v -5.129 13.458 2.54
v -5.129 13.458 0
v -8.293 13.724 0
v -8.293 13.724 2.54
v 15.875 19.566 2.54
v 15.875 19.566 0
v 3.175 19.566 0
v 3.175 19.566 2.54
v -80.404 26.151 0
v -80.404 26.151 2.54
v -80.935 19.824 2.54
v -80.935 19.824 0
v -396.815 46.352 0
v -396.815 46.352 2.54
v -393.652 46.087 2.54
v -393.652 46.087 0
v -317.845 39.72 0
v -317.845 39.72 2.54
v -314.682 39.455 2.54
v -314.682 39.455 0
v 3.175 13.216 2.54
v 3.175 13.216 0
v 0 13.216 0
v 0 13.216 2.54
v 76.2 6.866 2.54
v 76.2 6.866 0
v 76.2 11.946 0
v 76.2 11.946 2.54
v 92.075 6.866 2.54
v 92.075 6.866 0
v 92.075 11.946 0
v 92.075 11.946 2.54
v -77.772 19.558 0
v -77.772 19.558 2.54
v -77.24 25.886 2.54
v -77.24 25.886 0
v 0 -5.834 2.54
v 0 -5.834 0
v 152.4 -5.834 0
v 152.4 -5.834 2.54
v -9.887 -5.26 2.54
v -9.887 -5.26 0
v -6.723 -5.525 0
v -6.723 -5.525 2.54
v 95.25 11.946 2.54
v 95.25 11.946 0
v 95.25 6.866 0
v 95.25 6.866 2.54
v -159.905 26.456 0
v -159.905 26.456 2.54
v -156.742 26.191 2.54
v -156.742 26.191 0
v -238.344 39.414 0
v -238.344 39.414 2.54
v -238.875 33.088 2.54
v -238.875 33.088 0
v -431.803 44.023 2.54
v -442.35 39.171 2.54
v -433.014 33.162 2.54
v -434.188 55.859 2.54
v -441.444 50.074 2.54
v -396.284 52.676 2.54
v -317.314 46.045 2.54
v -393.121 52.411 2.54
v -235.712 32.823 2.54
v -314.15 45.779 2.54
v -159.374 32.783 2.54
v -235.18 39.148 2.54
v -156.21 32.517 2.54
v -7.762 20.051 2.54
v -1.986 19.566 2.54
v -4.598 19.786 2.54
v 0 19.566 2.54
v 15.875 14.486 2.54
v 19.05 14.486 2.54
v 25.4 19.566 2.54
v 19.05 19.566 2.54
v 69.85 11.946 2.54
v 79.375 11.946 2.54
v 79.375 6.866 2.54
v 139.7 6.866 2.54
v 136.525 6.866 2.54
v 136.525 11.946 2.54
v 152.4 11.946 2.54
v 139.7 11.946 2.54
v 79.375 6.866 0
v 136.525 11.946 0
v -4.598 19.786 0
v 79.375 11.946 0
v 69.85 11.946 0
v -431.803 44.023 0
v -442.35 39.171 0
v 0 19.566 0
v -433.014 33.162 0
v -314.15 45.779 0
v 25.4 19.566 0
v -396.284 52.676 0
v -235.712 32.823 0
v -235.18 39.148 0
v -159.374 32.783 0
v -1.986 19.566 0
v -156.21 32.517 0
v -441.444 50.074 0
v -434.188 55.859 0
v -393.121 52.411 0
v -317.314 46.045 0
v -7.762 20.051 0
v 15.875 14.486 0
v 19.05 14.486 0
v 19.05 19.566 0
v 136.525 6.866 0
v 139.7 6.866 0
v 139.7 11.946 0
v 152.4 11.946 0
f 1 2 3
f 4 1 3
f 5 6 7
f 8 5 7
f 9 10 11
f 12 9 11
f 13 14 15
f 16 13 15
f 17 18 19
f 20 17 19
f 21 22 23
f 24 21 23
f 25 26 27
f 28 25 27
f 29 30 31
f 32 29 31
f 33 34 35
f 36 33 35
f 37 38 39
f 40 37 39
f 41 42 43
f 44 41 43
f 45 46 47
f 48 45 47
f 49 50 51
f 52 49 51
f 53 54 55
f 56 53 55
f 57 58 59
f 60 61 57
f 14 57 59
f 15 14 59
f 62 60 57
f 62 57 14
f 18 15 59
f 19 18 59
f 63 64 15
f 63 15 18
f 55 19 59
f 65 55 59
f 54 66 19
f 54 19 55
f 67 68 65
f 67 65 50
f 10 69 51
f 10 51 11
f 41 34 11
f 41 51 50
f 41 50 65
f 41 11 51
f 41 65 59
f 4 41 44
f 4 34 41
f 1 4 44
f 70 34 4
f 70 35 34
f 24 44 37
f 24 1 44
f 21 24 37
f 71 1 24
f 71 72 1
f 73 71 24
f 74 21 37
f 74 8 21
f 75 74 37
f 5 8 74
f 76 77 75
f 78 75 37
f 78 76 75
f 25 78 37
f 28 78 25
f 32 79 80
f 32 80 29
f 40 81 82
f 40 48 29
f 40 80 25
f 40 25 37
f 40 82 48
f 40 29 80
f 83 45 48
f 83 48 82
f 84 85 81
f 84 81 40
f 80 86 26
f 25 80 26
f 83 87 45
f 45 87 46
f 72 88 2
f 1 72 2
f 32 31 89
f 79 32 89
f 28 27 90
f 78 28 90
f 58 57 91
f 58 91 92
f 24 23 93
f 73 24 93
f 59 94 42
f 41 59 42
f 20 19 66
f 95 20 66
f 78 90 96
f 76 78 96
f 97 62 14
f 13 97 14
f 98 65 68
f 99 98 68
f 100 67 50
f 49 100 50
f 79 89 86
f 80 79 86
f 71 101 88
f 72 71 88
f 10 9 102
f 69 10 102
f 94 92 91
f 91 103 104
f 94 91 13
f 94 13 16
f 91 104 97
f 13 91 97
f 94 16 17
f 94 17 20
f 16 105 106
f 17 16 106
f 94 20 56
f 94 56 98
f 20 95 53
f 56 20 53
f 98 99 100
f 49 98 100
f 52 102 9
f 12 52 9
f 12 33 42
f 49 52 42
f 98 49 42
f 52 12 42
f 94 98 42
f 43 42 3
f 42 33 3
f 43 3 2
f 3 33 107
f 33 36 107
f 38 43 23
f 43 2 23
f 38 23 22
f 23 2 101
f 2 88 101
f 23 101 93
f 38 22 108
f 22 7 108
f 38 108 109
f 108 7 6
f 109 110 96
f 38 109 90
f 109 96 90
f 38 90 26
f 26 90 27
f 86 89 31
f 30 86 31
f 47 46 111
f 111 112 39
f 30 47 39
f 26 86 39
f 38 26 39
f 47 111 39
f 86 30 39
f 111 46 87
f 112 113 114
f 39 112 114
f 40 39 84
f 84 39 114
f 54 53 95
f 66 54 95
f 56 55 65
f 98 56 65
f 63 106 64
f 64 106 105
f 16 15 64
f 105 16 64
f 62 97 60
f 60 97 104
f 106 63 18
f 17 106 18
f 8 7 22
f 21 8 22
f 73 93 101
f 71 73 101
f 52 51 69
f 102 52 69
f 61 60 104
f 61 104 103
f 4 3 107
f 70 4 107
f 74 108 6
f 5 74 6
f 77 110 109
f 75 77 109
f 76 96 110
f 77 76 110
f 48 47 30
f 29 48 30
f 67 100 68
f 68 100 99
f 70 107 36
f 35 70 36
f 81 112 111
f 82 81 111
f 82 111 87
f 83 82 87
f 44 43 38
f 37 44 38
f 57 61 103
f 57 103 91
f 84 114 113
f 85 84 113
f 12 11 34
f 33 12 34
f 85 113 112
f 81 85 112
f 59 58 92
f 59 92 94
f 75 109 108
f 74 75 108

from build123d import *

# Parameters (mm, degrees)
BOSS_EXTRUDE1_DEPTH     = 2.54
CUT_EXTRUDE1_DEPTH      = 1
CUT_EXTRUDE1_DEPTH_BACK = 3.54
CUT_EXTRUDE2_DEPTH      = 7.62


with BuildPart() as part:
    # Sketch1 → Boss-Extrude1 (new body)
    with BuildSketch(Plane.XY):
        Polygon((-945.957227657, 86.137779906), (-945.969713578, 86.1172966), (-949.121092485, 86.403457059), (-949.65244679, 80.075727402), (-9.887238192, -5.25964904), (-6.723373364, -5.525326193), (0, -5.833733414), (152.4, -5.833733414), (152.4, 11.946266586), (139.7, 11.946266586), (139.7, 6.866266586), (136.525, 6.866266586), (136.525, 11.946266586), (95.25, 11.946266586), (95.25, 6.866266586), (92.075, 6.866266586), (92.075, 11.946266586), (79.375, 11.946266586), (79.375, 6.866266586), (76.2, 6.866266586), (76.2, 11.946266586), (69.85, 11.946266586), (25.4, 19.566266586), (19.05, 19.566266586), (19.05, 14.486266586), (15.875, 14.486266586), (15.875, 19.566266586), (3.175, 19.566266586), (3.175, 13.216266586), (0, 13.216266586), (0, 19.566266586), (-1.98607431, 19.566266586), (-4.597956143, 19.785592432), (-5.129310448, 13.457862776), (-8.293175277, 13.723539928), (-7.761820971, 20.051269584), (-944.89858306, 98.744842179), align=None)
    extrude(amount=BOSS_EXTRUDE1_DEPTH)

    # Sketch2 → Cut-Extrude1 (cut, two sides)
    with BuildSketch(Plane.XY.offset(2.54)) as cut_extrude1_sk:
        Polygon((-867.4716203, 85.879017088), (-866.940953695, 92.198557139), (-870.104818523, 92.464234292), (-870.635482595, 86.144724398), align=None)
        Polygon((-788.501617399, 79.246962625), (-787.970887585, 85.567255411), (-791.134752413, 85.832932563), (-791.665479694, 79.512669935), align=None)
        Polygon((-709.531614498, 72.614908162), (-709.000821475, 78.935953682), (-712.164686303, 79.201630835), (-712.695476794, 72.880615473), align=None)
        Polygon((-630.561611597, 65.9828537), (-630.030755365, 72.304651954), (-633.194620194, 72.570329107), (-633.725473893, 66.24856101), align=None)
        Polygon((-551.591608696, 59.350799237), (-551.060689256, 65.673350226), (-554.224554084, 65.939027378), (-554.755470992, 59.616506547), align=None)
        Polygon((-472.621605795, 52.718744774), (-472.090623146, 59.042048497), (-475.254487974, 59.30772565), (-475.785468091, 52.984452084), align=None)
        Polygon((-393.651602894, 46.086690311), (-393.120557036, 52.410746769), (-396.284421864, 52.676423921), (-396.81546519, 46.352397622), align=None)
        Polygon((-314.681599993, 39.454635849), (-314.150490926, 45.77944504), (-317.314355754, 46.045122193), (-317.845462289, 39.720343159), align=None)
        Polygon((-235.711597092, 32.822581386), (-235.180424816, 39.148143312), (-238.344289645, 39.413820465), (-238.875459388, 33.088288696), align=None)
        Polygon((-156.741594191, 26.190526923), (-156.210358707, 32.516841584), (-159.374223535, 32.782518736), (-159.905456487, 26.456234233), align=None)
        Polygon((-77.240292597, 25.885539855), (-80.404157425, 26.151217008), (-80.935453586, 19.824179771), (-77.77159129, 19.55847246), align=None)
    extrude(amount=CUT_EXTRUDE1_DEPTH, mode=Mode.SUBTRACT)
    extrude(cut_extrude1_sk.sketch, amount=-CUT_EXTRUDE1_DEPTH_BACK, mode=Mode.SUBTRACT)

    # Sketch3 → Cut-Extrude2 (cut)
    with BuildSketch(Plane.XY.offset(2.54)):
        Polygon((-434.187522505, 55.859236209), (-441.444486836, 50.074133547), (-431.803024179, 44.022577198), (-442.349656028, 39.171455119), (-433.014300591, 33.162402364), (-1000.074058288, -11.780320021), (-979.22273749, 133.880780984), align=None)
    extrude(amount=-CUT_EXTRUDE2_DEPTH, mode=Mode.SUBTRACT)


solid = part.part
